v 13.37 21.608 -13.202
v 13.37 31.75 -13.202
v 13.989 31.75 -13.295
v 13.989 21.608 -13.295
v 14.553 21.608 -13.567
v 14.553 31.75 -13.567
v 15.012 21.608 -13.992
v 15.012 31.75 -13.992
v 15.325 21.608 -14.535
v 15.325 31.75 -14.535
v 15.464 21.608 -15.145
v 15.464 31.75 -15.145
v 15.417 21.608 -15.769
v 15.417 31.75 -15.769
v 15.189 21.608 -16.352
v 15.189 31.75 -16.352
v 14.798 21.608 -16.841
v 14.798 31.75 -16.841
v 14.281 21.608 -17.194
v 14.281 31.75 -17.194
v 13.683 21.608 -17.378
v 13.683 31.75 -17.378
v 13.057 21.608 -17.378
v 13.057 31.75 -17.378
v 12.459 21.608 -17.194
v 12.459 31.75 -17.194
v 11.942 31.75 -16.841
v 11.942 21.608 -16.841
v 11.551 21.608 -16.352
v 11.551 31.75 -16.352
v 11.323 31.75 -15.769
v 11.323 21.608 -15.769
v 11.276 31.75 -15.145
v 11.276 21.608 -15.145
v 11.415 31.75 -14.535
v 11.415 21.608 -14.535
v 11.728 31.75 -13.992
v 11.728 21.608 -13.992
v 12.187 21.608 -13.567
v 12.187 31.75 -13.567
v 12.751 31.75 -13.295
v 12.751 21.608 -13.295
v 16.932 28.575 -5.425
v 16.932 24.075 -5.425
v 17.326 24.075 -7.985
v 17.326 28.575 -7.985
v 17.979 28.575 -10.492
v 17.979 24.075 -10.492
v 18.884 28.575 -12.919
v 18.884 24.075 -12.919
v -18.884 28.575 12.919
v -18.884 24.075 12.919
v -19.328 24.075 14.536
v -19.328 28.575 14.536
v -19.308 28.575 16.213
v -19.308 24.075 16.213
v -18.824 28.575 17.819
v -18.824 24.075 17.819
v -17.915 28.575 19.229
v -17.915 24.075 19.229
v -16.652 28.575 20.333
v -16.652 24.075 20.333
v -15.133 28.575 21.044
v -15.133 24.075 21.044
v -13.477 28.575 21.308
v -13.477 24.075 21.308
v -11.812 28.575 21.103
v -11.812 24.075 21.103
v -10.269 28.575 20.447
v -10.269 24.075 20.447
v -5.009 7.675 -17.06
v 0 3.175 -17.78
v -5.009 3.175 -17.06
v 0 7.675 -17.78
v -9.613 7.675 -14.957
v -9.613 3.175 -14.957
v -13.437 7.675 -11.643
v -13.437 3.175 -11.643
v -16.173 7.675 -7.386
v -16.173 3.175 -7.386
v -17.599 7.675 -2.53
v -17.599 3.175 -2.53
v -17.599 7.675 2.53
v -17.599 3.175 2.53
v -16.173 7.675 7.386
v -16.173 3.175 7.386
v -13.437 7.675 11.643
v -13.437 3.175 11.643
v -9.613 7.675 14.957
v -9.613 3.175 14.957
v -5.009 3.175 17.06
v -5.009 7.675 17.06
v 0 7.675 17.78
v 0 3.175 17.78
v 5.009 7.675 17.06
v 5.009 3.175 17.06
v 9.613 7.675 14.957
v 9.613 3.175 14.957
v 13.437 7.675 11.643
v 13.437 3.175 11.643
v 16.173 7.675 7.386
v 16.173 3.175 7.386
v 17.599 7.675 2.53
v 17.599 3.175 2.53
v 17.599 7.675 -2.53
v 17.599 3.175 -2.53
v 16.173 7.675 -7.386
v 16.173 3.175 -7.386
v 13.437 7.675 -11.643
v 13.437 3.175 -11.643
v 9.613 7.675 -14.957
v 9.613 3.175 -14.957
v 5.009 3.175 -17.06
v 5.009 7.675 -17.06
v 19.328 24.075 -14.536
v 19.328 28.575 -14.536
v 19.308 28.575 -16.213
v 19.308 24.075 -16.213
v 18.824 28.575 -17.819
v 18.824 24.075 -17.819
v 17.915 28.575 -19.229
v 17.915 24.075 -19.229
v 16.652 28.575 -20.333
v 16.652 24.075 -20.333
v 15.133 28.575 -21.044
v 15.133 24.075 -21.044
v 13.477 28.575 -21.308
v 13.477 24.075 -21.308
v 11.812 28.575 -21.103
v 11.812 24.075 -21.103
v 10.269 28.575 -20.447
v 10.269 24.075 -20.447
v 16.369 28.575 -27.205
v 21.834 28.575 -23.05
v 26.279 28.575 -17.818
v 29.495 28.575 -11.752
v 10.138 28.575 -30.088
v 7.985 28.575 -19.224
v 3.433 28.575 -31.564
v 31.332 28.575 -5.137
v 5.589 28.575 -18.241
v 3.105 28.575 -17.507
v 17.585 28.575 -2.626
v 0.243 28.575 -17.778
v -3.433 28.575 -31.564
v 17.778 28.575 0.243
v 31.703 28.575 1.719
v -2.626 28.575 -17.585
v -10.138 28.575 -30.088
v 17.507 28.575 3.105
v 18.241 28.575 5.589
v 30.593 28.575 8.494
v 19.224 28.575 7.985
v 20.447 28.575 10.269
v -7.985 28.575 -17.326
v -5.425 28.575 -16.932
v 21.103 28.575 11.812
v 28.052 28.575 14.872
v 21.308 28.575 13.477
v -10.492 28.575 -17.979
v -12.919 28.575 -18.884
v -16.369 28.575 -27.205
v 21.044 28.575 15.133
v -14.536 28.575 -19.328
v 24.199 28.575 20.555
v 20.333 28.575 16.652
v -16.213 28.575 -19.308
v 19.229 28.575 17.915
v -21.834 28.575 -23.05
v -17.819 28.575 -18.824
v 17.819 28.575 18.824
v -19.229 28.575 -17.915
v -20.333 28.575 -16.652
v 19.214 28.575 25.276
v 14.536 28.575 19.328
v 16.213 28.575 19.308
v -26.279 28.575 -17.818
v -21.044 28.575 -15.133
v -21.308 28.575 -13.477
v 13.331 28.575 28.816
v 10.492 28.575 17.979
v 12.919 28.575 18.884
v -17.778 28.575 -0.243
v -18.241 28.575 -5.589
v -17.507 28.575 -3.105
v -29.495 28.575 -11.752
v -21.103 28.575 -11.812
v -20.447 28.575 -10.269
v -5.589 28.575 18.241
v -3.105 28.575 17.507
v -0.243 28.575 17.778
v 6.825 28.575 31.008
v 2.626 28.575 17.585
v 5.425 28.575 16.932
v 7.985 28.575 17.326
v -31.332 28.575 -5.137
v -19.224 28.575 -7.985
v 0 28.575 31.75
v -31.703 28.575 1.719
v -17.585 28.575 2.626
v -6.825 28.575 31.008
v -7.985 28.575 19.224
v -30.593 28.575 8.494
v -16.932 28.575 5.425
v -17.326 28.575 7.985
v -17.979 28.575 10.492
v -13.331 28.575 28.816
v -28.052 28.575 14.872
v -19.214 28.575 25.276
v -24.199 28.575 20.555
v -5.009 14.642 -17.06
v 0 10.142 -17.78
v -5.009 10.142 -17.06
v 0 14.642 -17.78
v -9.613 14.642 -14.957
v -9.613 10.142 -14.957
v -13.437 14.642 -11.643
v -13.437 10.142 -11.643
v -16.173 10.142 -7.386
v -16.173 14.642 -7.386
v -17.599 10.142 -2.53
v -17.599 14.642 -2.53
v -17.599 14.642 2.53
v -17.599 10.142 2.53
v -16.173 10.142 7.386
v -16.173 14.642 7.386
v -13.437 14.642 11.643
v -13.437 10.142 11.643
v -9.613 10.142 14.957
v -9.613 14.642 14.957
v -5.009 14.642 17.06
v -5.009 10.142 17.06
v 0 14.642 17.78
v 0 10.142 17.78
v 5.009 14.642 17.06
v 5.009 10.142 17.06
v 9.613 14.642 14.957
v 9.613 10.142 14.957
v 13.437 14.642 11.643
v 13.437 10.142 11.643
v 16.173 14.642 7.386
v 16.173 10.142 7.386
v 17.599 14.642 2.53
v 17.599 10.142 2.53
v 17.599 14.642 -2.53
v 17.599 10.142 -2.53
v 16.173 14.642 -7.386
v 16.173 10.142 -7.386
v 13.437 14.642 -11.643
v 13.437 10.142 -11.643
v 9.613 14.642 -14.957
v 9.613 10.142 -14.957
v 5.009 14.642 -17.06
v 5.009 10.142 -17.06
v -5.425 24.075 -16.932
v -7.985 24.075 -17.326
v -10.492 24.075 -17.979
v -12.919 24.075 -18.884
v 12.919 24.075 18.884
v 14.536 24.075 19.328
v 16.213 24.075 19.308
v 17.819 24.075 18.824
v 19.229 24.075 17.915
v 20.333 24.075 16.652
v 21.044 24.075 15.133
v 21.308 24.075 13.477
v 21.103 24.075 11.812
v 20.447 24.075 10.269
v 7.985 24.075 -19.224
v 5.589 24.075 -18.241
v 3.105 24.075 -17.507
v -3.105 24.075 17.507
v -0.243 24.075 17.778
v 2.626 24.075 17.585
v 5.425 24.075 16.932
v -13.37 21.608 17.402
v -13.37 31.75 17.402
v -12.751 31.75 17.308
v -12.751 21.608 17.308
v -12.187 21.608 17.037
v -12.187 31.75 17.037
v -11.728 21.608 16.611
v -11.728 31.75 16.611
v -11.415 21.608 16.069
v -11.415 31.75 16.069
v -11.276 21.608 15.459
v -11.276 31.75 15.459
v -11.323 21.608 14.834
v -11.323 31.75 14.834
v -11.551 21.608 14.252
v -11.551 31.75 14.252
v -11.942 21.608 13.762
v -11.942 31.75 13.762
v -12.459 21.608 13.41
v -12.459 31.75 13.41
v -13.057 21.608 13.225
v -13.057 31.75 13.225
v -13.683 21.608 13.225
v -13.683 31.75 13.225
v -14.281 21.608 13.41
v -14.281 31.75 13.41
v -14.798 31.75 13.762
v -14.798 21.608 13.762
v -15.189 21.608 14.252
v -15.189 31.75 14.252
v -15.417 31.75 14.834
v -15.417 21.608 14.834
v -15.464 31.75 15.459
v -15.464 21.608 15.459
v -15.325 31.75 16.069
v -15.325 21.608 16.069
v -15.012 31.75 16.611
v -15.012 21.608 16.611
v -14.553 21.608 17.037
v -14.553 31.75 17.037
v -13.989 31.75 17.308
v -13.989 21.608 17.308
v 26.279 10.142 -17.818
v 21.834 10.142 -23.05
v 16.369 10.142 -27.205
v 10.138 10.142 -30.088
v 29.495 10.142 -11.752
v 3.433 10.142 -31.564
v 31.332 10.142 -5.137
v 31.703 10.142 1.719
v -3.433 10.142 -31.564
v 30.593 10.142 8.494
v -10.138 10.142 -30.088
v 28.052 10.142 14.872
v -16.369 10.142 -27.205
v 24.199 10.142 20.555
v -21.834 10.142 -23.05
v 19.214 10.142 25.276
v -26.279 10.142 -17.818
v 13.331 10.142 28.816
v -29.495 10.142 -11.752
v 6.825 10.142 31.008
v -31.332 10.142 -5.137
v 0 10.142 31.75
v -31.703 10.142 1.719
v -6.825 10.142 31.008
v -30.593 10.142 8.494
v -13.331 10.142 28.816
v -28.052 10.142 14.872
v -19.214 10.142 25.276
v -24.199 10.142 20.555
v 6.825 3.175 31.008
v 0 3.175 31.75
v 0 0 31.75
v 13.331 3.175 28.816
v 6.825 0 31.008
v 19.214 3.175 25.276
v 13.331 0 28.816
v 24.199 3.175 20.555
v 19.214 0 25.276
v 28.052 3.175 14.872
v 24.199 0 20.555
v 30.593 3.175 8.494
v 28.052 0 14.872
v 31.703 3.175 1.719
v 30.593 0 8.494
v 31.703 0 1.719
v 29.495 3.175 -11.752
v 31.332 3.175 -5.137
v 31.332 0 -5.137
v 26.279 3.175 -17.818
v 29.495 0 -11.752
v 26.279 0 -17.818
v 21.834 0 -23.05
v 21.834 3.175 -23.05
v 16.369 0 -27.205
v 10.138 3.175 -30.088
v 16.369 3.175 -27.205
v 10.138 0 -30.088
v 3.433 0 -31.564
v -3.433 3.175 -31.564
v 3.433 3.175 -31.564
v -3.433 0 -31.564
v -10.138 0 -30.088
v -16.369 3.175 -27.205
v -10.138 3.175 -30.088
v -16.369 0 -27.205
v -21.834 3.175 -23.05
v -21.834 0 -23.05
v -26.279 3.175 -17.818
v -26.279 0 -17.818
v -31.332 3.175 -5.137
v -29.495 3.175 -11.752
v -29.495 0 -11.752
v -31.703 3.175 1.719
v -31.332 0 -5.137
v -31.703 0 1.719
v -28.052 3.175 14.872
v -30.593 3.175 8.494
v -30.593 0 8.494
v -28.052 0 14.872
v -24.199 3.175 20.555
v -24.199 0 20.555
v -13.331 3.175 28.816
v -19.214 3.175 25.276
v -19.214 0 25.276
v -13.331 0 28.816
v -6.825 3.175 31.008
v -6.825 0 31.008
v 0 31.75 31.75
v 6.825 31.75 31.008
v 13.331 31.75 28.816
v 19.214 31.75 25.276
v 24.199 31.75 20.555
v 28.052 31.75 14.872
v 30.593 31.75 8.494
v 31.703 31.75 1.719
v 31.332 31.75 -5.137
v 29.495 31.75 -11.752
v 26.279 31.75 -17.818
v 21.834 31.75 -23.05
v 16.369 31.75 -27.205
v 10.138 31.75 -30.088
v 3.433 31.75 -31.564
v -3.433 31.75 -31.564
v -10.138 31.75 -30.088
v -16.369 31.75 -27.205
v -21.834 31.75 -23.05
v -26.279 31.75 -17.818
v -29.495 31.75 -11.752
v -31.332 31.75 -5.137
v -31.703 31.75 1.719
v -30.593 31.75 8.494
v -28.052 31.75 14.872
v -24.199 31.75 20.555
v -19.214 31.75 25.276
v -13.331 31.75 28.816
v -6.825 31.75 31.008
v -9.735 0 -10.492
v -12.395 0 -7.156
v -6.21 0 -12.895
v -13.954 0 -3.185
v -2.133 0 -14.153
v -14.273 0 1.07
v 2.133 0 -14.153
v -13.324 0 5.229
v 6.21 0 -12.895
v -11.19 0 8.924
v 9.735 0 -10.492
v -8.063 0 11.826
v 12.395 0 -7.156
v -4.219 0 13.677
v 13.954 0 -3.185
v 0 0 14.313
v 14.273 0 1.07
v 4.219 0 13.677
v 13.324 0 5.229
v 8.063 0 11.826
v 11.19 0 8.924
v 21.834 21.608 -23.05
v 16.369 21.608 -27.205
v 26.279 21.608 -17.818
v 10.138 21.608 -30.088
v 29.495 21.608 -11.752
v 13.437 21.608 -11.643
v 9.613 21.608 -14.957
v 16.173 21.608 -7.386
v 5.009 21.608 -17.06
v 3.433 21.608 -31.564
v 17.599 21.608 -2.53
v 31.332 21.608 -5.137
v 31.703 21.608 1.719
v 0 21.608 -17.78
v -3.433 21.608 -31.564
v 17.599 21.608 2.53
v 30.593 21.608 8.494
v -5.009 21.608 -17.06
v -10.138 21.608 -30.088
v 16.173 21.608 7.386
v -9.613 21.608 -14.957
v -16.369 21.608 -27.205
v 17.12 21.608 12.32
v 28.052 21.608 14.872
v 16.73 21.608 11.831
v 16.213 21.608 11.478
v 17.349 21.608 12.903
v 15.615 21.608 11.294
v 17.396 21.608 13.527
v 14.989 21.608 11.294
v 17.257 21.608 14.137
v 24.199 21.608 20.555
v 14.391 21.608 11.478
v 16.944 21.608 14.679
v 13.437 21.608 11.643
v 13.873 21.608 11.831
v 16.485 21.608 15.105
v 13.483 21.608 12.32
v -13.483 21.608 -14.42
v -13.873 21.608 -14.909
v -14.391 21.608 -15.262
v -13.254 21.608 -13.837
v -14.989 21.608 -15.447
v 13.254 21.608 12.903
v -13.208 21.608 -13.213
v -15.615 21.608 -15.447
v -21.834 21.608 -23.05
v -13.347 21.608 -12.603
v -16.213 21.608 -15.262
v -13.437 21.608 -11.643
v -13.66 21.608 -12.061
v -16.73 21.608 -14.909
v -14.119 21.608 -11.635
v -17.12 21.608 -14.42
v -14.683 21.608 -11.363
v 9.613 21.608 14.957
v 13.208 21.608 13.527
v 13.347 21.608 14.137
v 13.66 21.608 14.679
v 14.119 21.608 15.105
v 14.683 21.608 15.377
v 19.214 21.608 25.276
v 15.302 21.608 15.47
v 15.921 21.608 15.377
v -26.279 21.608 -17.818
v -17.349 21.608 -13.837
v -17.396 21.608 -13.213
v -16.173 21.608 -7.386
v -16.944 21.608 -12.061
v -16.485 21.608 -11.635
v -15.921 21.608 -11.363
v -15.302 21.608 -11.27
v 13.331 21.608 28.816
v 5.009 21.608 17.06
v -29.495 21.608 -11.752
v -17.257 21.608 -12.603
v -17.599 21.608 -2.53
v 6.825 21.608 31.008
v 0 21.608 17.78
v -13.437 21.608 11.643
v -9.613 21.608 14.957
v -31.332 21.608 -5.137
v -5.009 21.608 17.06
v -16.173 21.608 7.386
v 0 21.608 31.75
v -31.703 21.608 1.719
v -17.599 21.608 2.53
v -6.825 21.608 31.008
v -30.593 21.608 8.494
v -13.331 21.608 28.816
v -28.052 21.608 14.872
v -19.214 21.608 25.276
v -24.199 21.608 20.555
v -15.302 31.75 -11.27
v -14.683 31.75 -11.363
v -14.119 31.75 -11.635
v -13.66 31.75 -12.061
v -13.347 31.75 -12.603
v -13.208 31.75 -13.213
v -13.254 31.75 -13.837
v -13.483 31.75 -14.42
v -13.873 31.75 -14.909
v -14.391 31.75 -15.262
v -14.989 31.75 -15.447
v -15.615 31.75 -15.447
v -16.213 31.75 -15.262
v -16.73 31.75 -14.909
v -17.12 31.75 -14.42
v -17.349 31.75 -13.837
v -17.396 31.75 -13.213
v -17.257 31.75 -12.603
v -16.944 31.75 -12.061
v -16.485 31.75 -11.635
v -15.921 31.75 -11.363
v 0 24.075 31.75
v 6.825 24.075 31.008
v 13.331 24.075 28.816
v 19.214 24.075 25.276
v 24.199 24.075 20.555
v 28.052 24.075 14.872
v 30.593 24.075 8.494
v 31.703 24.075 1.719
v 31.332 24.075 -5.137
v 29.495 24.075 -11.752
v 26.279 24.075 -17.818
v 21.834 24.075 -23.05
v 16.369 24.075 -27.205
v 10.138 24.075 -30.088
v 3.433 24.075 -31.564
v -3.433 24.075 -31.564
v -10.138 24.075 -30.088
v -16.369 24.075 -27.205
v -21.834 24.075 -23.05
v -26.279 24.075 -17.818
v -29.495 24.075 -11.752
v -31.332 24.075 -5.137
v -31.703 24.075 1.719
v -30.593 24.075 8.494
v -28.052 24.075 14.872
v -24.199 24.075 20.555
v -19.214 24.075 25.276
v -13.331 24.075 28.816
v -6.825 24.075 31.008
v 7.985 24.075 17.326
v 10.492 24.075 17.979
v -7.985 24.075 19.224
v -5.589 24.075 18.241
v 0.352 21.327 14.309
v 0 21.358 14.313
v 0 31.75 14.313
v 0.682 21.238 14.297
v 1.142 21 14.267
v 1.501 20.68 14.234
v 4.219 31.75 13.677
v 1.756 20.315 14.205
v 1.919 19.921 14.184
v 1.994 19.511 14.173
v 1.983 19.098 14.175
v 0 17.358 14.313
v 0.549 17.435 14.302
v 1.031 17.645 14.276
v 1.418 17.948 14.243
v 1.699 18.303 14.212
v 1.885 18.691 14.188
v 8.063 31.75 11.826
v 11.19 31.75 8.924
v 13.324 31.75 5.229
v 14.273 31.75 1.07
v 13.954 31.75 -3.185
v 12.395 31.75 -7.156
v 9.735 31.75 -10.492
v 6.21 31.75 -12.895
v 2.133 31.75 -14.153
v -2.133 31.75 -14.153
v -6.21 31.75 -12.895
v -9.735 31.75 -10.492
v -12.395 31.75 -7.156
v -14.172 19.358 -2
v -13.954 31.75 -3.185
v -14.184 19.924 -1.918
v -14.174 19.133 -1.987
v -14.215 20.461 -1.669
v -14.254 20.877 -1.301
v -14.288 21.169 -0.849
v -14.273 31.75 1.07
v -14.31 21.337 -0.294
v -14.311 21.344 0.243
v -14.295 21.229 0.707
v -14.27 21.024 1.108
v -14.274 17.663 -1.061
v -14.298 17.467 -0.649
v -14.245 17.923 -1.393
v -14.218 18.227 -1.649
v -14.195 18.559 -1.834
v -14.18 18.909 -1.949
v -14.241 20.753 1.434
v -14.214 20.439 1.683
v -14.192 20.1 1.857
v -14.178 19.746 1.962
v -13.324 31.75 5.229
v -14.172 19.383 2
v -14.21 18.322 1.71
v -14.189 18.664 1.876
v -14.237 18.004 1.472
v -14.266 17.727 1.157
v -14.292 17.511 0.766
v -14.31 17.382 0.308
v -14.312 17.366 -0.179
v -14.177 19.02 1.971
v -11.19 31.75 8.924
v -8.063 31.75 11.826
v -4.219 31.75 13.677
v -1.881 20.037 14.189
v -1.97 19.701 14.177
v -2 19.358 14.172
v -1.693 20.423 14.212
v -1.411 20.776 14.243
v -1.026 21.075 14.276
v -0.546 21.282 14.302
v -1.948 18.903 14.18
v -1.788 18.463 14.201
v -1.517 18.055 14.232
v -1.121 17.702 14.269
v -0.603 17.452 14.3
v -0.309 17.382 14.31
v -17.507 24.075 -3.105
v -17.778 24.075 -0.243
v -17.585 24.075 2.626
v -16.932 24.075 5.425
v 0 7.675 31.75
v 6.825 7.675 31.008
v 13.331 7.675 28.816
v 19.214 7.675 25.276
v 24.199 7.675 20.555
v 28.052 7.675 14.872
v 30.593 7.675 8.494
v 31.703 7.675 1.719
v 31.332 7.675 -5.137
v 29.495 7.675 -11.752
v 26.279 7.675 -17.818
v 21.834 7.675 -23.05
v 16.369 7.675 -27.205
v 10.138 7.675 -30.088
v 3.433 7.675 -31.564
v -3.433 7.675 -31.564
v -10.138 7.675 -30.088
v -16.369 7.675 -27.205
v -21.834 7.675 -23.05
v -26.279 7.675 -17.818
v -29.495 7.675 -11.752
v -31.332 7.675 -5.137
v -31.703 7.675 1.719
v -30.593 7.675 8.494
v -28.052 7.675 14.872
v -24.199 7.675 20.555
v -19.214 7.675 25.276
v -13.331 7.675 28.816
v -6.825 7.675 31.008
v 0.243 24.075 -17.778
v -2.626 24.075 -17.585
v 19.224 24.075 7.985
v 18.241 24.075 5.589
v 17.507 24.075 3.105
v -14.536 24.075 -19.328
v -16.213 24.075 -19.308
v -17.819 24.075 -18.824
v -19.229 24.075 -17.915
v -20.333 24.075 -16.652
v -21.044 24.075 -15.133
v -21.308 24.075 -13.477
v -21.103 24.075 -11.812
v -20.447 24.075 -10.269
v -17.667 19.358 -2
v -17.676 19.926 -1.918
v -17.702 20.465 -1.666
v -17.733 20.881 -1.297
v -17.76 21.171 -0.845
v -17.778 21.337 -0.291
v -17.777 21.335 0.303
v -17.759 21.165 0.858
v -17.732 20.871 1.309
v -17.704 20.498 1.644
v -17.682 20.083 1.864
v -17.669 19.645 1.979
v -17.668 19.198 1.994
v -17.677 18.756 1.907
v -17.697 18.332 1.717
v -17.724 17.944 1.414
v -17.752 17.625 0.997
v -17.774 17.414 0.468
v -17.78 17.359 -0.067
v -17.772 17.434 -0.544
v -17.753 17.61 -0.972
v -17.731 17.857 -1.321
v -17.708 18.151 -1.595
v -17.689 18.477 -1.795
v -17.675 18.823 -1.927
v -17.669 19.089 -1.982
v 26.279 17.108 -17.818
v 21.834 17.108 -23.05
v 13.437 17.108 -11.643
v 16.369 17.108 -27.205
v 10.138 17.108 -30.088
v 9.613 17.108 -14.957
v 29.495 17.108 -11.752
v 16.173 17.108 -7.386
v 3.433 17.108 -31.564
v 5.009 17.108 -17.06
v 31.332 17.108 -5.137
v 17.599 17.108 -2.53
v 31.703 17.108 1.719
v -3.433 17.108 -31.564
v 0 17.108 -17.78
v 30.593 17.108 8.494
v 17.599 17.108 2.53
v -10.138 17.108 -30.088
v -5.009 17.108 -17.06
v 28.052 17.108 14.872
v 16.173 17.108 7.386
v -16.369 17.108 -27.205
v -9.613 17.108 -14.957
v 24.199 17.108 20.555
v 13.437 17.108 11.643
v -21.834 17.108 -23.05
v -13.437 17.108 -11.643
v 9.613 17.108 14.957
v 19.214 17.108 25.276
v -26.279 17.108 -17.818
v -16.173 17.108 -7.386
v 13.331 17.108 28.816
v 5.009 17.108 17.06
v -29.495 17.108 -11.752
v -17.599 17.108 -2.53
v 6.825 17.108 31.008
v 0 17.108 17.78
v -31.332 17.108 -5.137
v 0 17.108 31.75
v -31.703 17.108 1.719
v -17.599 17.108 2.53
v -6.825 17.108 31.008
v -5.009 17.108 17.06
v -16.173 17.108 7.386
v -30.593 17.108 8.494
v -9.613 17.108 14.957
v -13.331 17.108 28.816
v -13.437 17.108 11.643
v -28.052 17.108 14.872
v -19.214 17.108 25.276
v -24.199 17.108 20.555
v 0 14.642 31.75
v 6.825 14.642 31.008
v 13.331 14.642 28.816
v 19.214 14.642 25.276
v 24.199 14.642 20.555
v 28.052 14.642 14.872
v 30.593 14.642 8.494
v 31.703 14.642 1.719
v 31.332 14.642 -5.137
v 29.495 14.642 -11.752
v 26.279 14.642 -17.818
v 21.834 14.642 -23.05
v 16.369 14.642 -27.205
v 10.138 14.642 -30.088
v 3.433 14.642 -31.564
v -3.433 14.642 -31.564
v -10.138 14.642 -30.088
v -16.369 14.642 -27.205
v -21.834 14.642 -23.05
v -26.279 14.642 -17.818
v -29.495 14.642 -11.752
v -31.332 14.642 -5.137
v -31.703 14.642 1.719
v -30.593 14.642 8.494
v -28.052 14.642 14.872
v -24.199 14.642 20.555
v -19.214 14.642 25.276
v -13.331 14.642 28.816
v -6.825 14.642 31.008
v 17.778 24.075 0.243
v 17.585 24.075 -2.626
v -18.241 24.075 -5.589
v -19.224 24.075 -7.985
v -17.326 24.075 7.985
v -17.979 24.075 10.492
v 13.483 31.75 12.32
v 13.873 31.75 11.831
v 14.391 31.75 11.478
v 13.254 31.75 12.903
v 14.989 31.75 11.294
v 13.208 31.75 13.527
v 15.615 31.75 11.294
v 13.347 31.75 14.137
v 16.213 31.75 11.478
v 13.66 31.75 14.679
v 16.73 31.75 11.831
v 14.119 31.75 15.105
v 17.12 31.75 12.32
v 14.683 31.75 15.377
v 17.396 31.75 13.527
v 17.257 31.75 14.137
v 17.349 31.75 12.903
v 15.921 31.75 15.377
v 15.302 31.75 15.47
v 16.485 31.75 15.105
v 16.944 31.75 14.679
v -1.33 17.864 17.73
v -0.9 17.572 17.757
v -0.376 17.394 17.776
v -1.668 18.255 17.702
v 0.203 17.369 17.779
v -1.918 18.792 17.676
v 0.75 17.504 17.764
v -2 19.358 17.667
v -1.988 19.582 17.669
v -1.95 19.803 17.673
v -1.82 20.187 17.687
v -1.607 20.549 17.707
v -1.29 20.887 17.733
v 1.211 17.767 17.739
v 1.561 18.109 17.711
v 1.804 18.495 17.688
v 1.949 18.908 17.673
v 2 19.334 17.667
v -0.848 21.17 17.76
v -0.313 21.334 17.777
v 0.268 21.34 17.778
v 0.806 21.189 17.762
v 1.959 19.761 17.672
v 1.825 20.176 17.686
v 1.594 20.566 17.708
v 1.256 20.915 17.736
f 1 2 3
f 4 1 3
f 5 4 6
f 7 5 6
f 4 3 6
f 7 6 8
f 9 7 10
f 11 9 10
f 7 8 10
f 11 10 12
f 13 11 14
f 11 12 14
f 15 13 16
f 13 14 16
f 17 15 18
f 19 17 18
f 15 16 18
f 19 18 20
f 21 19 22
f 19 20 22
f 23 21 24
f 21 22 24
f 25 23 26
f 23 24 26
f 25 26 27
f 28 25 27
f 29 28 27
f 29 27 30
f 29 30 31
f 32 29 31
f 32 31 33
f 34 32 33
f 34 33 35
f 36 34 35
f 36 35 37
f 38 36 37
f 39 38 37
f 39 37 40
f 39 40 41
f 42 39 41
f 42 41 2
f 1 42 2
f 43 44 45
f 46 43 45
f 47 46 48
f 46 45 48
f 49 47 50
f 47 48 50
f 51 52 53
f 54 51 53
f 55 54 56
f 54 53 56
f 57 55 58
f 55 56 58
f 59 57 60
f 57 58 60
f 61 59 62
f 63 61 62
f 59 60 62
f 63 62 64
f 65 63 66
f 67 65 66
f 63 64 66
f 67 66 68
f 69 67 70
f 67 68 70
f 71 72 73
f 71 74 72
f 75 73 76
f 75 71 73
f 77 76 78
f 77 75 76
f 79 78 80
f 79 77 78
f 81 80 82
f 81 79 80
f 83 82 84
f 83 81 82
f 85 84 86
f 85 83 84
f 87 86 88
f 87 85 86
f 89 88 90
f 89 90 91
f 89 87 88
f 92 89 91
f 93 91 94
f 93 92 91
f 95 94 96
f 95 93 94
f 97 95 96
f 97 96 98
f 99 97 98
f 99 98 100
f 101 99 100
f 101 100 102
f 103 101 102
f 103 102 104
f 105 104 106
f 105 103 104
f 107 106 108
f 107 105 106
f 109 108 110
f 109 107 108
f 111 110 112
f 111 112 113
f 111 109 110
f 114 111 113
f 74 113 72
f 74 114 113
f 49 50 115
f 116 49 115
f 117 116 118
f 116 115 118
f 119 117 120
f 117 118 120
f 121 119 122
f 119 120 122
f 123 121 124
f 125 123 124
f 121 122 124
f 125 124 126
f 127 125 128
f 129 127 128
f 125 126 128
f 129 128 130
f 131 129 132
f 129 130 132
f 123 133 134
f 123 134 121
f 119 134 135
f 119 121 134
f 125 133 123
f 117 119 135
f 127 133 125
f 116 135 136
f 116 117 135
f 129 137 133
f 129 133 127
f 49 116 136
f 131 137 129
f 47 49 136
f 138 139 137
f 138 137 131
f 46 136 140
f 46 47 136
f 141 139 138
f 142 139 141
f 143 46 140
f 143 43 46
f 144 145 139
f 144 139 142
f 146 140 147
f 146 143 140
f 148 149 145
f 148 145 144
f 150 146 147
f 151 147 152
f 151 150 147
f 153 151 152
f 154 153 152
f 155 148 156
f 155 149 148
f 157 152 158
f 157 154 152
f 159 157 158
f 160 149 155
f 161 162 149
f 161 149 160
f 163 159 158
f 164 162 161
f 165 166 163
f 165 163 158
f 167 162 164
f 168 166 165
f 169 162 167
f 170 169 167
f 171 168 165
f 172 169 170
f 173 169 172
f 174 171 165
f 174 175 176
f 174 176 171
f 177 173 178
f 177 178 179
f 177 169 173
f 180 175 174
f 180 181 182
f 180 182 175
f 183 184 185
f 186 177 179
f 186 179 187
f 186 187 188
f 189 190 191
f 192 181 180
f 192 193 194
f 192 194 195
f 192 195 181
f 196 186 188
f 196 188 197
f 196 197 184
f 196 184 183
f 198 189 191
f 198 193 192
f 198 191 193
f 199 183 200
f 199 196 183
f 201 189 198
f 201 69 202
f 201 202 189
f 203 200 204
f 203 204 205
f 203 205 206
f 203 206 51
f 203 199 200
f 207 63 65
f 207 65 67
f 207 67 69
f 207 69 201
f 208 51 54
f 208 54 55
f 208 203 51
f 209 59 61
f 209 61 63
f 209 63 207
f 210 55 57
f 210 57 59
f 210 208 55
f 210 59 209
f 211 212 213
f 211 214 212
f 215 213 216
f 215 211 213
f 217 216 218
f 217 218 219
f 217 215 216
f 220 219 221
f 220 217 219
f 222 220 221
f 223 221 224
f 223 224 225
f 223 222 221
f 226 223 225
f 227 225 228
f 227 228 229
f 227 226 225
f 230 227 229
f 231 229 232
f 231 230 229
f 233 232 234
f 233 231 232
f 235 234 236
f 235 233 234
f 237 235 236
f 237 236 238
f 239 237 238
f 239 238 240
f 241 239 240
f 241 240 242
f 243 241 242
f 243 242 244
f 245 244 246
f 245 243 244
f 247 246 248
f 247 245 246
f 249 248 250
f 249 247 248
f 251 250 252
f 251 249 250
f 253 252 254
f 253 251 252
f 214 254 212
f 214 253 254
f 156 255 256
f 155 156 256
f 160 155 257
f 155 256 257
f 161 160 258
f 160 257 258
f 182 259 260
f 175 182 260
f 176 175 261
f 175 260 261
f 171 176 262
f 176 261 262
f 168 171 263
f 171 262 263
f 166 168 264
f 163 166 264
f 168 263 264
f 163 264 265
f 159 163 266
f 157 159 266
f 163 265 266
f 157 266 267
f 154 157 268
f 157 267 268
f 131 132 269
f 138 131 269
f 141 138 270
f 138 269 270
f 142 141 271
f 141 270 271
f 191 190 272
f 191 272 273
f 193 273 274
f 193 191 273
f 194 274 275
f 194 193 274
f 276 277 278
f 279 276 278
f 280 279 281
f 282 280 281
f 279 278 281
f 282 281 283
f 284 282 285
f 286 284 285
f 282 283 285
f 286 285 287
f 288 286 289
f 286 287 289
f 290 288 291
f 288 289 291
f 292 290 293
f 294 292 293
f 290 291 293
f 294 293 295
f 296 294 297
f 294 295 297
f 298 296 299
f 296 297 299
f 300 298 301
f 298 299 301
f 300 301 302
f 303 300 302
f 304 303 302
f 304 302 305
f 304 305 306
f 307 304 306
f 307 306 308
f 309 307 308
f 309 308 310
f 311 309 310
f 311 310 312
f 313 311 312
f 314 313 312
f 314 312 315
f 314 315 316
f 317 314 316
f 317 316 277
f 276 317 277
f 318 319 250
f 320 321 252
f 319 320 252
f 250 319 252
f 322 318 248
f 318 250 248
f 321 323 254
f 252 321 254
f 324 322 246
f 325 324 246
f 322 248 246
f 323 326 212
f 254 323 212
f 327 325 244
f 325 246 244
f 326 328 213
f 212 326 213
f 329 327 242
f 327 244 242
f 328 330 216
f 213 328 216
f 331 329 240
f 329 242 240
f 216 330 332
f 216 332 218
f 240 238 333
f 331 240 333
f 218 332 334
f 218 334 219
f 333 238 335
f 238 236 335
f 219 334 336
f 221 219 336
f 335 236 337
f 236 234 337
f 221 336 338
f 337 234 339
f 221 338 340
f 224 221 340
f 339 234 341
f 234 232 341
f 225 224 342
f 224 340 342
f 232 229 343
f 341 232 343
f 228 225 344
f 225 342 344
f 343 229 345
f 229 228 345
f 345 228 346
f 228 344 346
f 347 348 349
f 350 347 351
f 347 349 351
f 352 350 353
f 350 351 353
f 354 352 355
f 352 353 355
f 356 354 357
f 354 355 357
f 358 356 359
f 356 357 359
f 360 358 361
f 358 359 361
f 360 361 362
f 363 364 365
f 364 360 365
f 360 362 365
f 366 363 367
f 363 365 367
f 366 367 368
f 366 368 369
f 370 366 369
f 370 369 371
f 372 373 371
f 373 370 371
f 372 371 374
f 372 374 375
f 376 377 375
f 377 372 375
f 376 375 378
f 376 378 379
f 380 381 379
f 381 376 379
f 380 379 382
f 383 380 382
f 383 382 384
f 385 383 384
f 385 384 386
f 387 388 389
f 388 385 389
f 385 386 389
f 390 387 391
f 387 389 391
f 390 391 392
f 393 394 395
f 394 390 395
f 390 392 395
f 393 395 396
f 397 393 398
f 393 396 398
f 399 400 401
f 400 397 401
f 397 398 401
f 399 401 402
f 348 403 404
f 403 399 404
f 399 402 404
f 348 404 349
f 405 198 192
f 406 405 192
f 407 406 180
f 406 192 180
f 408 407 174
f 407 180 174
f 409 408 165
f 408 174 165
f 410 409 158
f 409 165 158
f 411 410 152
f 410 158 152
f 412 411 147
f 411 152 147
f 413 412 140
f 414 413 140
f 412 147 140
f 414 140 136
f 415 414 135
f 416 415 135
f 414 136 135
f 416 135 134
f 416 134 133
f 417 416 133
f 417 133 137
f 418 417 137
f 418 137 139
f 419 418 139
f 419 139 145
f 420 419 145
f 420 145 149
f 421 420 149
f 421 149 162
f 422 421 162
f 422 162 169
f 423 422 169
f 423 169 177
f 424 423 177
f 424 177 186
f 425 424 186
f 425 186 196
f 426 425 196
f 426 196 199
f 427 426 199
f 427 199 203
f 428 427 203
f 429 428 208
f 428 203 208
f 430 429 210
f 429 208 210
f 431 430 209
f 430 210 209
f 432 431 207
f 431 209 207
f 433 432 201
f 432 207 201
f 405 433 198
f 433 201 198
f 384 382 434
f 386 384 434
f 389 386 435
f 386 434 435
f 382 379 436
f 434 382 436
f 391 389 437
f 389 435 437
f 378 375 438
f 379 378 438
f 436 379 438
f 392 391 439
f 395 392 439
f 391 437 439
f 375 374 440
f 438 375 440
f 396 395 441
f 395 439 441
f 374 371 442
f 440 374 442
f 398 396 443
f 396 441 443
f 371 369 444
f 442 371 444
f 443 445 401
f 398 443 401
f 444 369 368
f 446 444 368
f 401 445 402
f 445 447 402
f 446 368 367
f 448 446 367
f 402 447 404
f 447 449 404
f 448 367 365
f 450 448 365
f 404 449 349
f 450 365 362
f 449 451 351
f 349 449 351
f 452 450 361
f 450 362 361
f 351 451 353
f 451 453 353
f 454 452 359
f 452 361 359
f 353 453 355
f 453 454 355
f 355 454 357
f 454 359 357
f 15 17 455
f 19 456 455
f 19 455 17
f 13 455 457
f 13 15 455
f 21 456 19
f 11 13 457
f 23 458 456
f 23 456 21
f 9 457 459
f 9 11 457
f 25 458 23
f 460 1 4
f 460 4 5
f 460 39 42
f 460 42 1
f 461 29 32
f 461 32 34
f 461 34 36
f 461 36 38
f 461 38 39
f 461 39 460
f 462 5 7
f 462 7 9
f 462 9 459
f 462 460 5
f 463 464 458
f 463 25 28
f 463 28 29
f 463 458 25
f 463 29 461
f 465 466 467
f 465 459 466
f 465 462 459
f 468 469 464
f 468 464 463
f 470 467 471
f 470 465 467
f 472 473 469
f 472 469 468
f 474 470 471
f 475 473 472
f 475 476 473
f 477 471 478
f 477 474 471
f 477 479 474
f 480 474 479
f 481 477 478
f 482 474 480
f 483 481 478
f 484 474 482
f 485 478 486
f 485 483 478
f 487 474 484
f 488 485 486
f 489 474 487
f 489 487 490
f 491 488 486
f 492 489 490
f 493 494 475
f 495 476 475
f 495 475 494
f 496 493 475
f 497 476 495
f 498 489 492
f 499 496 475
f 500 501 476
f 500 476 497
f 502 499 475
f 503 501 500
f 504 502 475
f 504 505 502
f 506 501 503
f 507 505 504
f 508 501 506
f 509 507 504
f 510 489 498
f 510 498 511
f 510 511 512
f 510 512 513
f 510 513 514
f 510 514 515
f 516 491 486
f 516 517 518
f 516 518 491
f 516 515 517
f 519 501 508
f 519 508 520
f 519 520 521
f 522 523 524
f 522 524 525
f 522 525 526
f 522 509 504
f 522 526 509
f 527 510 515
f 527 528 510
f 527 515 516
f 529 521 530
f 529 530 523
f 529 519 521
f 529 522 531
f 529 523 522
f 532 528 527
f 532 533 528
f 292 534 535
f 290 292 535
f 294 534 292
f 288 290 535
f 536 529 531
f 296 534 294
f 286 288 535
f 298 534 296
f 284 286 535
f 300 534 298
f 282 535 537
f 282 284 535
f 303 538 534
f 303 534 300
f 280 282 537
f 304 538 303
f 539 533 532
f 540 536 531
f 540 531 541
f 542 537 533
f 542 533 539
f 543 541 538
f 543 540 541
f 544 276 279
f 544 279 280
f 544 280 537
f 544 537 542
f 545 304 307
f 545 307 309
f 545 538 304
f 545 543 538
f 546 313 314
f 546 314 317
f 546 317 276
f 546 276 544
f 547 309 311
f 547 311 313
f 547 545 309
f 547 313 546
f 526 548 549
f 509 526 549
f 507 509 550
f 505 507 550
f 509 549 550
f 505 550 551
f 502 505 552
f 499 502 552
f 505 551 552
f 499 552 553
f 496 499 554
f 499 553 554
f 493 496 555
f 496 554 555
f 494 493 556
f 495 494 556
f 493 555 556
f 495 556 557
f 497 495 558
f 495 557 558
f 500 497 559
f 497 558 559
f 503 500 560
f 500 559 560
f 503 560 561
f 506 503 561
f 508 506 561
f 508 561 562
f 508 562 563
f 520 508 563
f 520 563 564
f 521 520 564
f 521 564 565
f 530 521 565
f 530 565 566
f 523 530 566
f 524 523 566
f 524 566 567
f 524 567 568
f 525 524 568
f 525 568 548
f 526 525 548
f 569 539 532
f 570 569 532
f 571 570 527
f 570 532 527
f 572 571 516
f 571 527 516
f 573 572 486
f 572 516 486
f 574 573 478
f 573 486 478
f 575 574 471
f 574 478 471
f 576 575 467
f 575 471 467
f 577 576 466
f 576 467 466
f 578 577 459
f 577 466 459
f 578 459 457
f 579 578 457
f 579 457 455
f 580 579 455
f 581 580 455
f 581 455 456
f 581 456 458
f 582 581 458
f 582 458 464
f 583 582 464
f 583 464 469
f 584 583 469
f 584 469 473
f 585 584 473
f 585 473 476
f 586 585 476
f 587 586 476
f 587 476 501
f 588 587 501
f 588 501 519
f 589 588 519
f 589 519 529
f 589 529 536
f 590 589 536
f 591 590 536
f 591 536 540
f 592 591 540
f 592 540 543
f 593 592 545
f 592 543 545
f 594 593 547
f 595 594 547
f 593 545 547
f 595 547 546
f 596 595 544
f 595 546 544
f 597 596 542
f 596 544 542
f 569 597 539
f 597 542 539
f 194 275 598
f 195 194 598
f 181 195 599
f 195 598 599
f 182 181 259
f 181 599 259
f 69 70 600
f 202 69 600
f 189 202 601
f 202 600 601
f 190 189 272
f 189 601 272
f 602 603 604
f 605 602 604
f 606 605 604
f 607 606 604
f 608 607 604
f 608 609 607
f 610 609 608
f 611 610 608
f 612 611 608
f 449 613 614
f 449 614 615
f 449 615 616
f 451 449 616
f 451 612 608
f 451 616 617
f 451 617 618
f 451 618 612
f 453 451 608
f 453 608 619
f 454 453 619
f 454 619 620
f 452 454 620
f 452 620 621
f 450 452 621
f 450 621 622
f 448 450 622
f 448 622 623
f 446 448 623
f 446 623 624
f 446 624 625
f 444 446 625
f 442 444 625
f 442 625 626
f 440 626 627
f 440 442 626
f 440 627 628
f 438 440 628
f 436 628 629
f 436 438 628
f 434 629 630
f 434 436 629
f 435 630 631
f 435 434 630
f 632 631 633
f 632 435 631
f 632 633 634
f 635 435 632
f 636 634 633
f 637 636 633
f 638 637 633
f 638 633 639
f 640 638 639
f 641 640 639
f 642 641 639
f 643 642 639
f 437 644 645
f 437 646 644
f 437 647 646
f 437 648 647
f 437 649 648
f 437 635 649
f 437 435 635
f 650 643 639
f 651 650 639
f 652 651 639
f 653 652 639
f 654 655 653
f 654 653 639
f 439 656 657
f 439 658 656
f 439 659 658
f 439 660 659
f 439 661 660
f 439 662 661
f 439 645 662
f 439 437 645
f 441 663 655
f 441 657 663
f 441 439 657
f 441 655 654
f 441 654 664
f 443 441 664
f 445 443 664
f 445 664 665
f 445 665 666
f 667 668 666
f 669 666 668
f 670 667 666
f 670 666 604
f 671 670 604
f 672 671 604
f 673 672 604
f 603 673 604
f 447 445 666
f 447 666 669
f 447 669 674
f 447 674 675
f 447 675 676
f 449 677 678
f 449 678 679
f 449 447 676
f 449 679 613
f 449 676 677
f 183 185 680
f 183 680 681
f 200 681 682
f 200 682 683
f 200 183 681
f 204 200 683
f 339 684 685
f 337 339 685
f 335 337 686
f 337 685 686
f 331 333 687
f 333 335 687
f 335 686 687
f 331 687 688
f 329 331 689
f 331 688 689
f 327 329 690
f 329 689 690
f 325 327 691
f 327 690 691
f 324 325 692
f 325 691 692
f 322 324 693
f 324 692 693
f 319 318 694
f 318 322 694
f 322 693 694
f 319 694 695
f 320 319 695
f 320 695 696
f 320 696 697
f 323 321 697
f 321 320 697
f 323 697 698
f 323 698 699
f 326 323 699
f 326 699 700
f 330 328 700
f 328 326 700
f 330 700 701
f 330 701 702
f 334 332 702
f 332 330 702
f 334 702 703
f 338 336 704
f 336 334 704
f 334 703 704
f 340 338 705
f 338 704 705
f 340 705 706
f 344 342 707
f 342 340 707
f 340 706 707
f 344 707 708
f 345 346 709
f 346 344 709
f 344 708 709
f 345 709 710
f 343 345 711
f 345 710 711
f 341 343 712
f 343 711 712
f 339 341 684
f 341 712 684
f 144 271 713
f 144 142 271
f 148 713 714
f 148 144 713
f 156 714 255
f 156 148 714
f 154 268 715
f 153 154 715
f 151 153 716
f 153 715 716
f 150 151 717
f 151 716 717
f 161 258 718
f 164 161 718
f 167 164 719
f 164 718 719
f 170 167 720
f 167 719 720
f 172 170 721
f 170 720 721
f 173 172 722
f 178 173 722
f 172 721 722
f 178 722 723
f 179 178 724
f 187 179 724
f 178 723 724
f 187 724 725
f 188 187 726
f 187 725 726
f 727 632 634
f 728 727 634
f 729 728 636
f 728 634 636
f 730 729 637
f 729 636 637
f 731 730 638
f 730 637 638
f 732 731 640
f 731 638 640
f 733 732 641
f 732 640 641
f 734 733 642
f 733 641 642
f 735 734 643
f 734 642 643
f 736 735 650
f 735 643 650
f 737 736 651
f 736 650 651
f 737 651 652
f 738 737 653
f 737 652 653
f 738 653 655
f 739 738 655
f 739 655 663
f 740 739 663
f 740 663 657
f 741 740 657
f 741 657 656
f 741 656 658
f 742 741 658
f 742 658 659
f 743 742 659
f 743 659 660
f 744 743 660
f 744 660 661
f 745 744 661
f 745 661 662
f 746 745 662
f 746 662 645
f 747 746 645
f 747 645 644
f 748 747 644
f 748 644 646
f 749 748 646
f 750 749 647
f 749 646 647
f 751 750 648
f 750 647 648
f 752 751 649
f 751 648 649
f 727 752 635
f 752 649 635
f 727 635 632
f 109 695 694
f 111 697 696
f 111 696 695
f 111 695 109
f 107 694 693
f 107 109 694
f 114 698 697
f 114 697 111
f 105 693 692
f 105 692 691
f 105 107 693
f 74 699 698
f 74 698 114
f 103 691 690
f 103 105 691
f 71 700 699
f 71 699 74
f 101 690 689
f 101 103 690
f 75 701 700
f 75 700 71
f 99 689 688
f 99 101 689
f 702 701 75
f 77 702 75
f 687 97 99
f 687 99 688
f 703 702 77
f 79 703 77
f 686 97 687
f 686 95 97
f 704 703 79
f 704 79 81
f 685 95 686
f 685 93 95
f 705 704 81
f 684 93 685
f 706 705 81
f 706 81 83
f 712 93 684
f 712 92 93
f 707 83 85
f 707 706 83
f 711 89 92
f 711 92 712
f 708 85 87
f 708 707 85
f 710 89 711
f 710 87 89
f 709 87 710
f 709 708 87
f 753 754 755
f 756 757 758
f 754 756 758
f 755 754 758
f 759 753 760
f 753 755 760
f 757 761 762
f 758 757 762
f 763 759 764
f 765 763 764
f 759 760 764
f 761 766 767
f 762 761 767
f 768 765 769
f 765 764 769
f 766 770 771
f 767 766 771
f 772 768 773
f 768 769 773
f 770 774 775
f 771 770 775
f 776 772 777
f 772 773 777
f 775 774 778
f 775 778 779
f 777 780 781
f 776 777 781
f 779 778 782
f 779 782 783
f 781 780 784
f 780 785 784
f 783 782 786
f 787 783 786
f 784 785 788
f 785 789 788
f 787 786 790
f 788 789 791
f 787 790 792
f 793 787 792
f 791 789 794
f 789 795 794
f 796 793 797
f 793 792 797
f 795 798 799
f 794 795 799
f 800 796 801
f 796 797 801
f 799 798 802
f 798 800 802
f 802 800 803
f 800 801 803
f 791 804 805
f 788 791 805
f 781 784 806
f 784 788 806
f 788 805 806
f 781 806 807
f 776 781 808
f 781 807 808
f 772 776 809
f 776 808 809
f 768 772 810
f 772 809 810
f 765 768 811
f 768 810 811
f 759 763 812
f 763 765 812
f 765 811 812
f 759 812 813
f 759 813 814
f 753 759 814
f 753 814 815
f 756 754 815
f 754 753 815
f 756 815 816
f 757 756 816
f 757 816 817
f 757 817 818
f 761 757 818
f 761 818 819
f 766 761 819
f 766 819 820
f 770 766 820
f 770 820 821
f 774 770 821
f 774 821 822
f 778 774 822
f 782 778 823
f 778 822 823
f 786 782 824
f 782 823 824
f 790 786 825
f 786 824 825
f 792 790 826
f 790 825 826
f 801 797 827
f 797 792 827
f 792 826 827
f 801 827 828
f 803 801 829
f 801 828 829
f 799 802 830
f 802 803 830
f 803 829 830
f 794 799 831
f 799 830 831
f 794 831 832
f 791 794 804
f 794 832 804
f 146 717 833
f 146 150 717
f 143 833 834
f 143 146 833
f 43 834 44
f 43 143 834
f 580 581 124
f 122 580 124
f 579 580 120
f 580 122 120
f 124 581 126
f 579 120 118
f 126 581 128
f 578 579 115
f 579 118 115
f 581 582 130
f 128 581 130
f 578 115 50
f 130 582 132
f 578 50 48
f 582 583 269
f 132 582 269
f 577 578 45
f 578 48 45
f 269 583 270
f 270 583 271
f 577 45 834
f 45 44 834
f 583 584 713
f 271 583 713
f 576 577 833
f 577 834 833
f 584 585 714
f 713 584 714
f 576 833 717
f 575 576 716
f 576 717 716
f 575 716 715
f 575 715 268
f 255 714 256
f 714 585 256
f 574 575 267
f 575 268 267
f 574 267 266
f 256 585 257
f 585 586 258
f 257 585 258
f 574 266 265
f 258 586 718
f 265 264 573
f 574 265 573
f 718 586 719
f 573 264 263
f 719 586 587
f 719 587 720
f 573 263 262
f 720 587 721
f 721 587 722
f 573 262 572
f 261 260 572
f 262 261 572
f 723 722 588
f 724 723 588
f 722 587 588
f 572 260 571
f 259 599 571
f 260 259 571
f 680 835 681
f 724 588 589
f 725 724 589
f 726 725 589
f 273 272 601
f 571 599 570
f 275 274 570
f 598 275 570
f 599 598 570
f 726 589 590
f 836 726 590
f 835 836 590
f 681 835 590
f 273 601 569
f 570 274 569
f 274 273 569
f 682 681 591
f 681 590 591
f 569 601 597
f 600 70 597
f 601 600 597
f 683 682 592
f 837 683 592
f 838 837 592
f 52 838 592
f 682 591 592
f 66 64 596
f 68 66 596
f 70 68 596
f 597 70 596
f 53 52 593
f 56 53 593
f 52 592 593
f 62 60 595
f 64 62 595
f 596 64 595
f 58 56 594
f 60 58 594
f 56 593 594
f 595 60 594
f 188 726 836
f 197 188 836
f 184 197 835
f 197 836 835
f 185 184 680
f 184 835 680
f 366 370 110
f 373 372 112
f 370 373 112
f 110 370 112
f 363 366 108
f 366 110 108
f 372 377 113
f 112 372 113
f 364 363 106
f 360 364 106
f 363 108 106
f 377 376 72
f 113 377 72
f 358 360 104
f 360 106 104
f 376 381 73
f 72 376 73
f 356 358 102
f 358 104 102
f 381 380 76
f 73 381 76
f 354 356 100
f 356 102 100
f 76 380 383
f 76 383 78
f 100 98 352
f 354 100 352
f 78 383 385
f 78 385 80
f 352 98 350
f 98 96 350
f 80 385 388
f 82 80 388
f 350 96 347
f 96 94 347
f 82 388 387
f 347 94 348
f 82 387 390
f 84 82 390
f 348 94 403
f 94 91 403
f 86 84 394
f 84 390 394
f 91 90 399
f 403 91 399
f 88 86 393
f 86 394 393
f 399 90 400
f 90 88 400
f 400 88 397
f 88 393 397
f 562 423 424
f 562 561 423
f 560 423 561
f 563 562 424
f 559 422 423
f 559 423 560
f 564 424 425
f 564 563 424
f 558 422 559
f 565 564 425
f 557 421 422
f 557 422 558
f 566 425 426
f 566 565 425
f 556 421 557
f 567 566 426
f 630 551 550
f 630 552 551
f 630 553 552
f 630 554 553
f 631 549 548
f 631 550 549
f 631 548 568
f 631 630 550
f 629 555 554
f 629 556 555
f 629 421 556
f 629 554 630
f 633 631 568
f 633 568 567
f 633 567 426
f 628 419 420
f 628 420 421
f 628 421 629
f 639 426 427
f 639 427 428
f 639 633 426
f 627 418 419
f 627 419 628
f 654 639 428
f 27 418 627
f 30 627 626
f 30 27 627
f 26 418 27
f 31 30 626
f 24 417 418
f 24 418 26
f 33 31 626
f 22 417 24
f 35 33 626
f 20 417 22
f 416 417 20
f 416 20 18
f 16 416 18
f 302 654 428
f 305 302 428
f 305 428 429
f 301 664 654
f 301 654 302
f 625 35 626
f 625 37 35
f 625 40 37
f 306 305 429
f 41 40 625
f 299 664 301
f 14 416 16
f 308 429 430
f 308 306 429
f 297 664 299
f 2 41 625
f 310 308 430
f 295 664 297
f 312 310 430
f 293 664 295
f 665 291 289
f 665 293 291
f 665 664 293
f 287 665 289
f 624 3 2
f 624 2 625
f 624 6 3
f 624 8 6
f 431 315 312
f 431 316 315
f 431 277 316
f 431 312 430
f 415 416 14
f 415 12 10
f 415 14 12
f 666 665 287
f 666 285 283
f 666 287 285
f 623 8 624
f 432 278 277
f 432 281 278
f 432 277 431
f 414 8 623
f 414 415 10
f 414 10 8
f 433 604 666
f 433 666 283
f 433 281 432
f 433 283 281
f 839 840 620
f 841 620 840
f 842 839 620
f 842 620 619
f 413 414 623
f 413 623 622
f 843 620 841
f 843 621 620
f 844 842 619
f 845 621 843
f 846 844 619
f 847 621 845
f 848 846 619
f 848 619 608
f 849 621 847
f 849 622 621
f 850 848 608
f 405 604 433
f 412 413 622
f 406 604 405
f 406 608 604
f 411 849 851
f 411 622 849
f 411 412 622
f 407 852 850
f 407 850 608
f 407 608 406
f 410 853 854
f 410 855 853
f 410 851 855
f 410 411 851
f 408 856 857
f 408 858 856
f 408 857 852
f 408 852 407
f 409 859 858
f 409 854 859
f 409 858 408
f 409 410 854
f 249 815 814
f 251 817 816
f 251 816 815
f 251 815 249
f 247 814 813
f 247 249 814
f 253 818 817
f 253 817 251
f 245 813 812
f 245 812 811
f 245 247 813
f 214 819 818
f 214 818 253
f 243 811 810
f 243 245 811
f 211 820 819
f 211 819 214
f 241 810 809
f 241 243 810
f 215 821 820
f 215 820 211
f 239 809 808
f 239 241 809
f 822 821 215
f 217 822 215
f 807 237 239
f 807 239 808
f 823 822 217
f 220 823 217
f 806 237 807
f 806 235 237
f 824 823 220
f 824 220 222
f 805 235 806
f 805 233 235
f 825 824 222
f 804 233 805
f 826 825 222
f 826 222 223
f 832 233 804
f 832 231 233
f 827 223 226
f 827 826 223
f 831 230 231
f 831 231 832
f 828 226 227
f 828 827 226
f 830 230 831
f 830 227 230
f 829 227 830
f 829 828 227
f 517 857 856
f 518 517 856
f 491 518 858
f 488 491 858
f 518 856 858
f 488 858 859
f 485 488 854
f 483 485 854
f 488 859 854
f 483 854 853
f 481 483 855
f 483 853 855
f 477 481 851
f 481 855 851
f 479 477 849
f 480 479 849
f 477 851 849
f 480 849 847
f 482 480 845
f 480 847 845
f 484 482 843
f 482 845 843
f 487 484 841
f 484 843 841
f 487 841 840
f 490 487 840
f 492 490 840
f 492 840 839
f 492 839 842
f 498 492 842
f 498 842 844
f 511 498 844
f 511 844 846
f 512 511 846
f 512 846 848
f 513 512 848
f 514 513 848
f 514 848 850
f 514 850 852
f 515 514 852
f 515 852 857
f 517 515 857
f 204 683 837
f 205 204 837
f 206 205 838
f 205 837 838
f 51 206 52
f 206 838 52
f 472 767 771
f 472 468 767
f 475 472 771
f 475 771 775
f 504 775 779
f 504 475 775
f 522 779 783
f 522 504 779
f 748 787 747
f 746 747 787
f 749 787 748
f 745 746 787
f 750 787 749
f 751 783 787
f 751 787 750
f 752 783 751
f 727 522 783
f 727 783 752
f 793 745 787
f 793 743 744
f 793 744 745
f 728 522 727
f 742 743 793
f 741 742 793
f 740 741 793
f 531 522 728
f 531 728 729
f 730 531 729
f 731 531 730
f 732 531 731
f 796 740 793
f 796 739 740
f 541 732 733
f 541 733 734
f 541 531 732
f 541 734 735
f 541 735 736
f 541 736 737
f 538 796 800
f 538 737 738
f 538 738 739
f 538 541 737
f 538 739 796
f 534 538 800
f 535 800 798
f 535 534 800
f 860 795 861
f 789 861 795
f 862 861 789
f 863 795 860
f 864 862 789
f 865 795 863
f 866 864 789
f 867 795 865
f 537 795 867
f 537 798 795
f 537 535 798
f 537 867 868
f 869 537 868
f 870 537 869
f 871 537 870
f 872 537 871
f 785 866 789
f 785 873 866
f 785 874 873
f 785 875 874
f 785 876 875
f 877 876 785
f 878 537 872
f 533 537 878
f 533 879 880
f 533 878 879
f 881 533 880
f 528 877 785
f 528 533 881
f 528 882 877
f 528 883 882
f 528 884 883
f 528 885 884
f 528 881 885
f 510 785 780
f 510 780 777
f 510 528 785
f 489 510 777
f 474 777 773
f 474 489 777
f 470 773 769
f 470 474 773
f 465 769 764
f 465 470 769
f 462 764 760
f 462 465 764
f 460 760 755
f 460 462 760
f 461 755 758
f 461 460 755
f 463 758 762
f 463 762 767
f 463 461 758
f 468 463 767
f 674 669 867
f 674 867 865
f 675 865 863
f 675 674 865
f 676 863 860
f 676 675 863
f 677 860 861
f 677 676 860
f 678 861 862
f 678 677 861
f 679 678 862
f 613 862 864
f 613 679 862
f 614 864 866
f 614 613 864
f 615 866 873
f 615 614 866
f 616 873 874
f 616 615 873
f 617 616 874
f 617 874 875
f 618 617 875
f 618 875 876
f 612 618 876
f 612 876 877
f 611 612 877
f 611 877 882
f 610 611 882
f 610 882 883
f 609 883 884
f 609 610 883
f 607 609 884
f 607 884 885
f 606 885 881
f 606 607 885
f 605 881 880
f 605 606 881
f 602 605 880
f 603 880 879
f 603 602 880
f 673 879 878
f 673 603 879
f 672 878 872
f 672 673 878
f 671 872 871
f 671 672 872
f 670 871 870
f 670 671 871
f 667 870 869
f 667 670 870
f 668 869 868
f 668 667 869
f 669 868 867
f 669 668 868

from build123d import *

# Parameters (mm, degrees)
SKETCH1_R                        = 31.75
SKETCH1_R_2                      = 14.3129
BOSS_EXTRUDE1_DEPTH              = 31.75
SKETCH2_W                        = 13.97
SKETCH2_H                        = 4.5
BOSS_EXTRUDE2_START              = -7.675
BOSS_EXTRUDE2_DEPTH              = 4.5
CUT_EXTRUDE2_REACH               = 56.993
CUT_EXTRUDE2_END_RADIUS          = 17.78
SKETCH8_R                        = 2
CUT_EXTRUDE3_REACH               = 56.993
CUT_EXTRUDE3_END_RADIUS          = 17.78
SKETCH9_R                        = 2
SKETCH10_R                       = 1
CUT_EXTRUDE4_DEPTH               = 10.141666667
TAP_DRILL_FOR_M5X0_8_TAP1_REACH  = 74.51
TAP_DRILL_FOR_M5X0_8_TAP1_BORE_R = 2.1


# Read off the part's stored shape, not the designer's step: Boss-Extrude2
with BuildPart() as part:
    # Sketch1 → Boss-Extrude1 (new body)
    with BuildSketch(Plane(origin=(0, 0, 0), x_dir=(1, 0, 0), z_dir=(0, 1, 0))):
        with Locations(Location((0, 0, 0), (0, 0, 270))):
            Circle(SKETCH1_R)
        with Locations(Location((0, 0, 0), (0, 0, 270))):
            Circle(SKETCH1_R_2, mode=Mode.SUBTRACT)
    extrude(amount=BOSS_EXTRUDE1_DEPTH)

    # Sketch2 → Cut-Revolve2 (revolve, cut)
    with BuildSketch(Plane.XY, mode=Mode.PRIVATE) as cut_revolve2_sk:
        with Locations((24.765, 26.325)):
            Rectangle(SKETCH2_W, SKETCH2_H)
        with Locations((24.765, 12.391666667)):
            Rectangle(SKETCH2_W, SKETCH2_H)
        with Locations((24.765, 5.425)):
            Rectangle(SKETCH2_W, SKETCH2_H)
        with Locations((24.765, 19.358333333)):
            Rectangle(SKETCH2_W, SKETCH2_H)
    revolve(cut_revolve2_sk.sketch.rotate(Axis((0, 0, 0), (0, 1, 0)), 90), axis=Axis((0, 0, 0), (0, 1, 0)), mode=Mode.SUBTRACT)

    # Boss-Extrude2 outline → Boss-Extrude2 (add)
    with BuildSketch(Plane(origin=(0, 31.75, 0), x_dir=(1, 0, 0), z_dir=(0, 1, 0)).offset(BOSS_EXTRUDE2_START)):
        with BuildLine():
            ThreePointArc((-10.269067687, -20.446529483), (-6.799835435, -18.70202978), (-3.105226449, -17.506740665))
            ThreePointArc((-3.105226449, -17.506740665), (-11.698828781, -13.38901808), (-16.932025536, -5.425395031))
            ThreePointArc((-16.932025536, -5.425395031), (-17.620944734, -9.246944713), (-18.884341927, -12.918821503))
            ThreePointArc((-18.884341927, -12.918821503), (-17.322622903, -19.825310342), (-10.269067687, -20.446529483))
        make_face()
        with BuildLine():
            ThreePointArc((17.506740665, -3.105226449), (13.38901808, -11.698828781), (5.425395031, -16.932025536))
            ThreePointArc((5.425395031, -16.932025536), (9.246944713, -17.620944734), (12.918821503, -18.884341927))
            ThreePointArc((12.918821503, -18.884341927), (19.825310342, -17.322622903), (20.446529483, -10.269067687))
            ThreePointArc((20.446529483, -10.269067687), (18.70202978, -6.799835435), (17.506740665, -3.105226449))
        make_face()
        with BuildLine():
            ThreePointArc((-20.446529483, 10.269067687), (-18.70202978, 6.799835435), (-17.506740665, 3.105226449))
            ThreePointArc((-17.506740665, 3.105226449), (-13.38901808, 11.698828781), (-5.425395031, 16.932025536))
            ThreePointArc((-5.425395031, 16.932025536), (-9.246944713, 17.620944734), (-12.918821503, 18.884341927))
            ThreePointArc((-12.918821503, 18.884341927), (-19.825310342, 17.322622903), (-20.446529483, 10.269067687))
        make_face()
        with BuildLine():
            ThreePointArc((10.269067687, 20.446529483), (6.799835435, 18.70202978), (3.105226449, 17.506740665))
            ThreePointArc((3.105226449, 17.506740665), (11.698828781, 13.38901808), (16.932025536, 5.425395031))
            ThreePointArc((16.932025536, 5.425395031), (17.620944734, 9.246944713), (18.884341927, 12.918821503))
            ThreePointArc((18.884341927, 12.918821503), (17.322622903, 19.825310342), (10.269067687, 20.446529483))
        make_face()
    extrude(amount=BOSS_EXTRUDE2_DEPTH)

    # Cut-Extrude2: up to this cylinder (the profile starts inside it)
    cut_extrude2_end = Plane(origin=(0, 19.358333, 0), z_dir=(0, -1, 0)) * Cylinder(CUT_EXTRUDE2_END_RADIUS, 150.546, mode=Mode.PRIVATE)
    # Sketch8 → Cut-Extrude2 (cut, up to the surface)
    with BuildSketch(Plane.XY, mode=Mode.PRIVATE) as cut_extrude2_sk1:
        with Locations(Location((0, 19.358333333, 0), (0, 0, 180))):
            Circle(SKETCH8_R)
    cut_extrude2_tool1 = extrude(cut_extrude2_sk1.sketch, amount=CUT_EXTRUDE2_REACH, mode=Mode.PRIVATE) & cut_extrude2_end
    add(cut_extrude2_tool1.solids().sort_by_distance((0, 19.358333, 0))[0], mode=Mode.SUBTRACT)

    # Cut-Extrude3: up to this cylinder (the profile starts inside it)
    cut_extrude3_end = Plane(origin=(0, 19.358333, 0), z_dir=(0, -1, 0)) * Cylinder(CUT_EXTRUDE3_END_RADIUS, 150.546, mode=Mode.PRIVATE)
    # Sketch9 → Cut-Extrude3 (cut, up to the surface)
    with BuildSketch(Plane(origin=(0, 0, 0), x_dir=(0, 0, -1), z_dir=(1, 0, 0)), mode=Mode.PRIVATE) as cut_extrude3_sk1:
        with Locations((0, 19.358333333)):
            Circle(SKETCH9_R)
    cut_extrude3_tool1 = extrude(cut_extrude3_sk1.sketch, amount=-CUT_EXTRUDE3_REACH, mode=Mode.PRIVATE) & cut_extrude3_end
    add(cut_extrude3_tool1.solids().sort_by_distance((0, 19.358333, 0))[0], mode=Mode.SUBTRACT)

    # Sketch10 → Cut-Extrude4 (cut)
    with BuildSketch(Plane(origin=(0, 31.75, 0), x_dir=(1, 0, 0), z_dir=(0, 1, 0))):
        with Locations(Location((15.301734948, -13.370090036, 0), (0, 0, 270))):
            Circle(SKETCH10_R)
        with Locations(Location((13.370090036, 15.301734948, 0), (0, 0, 270))):
            Circle(SKETCH10_R)
        with Locations(Location((-15.301734948, 13.370090036, 0), (0, 0, 270))):
            Circle(SKETCH10_R)
        with Locations(Location((-13.370090036, -15.301734948, 0), (0, 0, 270))):
            Circle(SKETCH10_R)
    extrude(amount=-CUT_EXTRUDE4_DEPTH, mode=Mode.SUBTRACT)

    # Tap Drill for M5x0.8 Tap1 bore (on position points) → Tap Drill for M5x0.8 Tap1 (cut, up to next)
    with BuildSketch(Plane(origin=(15.301734948, 31.75, 13.370090036), x_dir=(0, 0, 1), z_dir=(0, 1, 0)), mode=Mode.PRIVATE) as tap_drill_for_m5x0_8_tap1_sk1:
        Circle(TAP_DRILL_FOR_M5X0_8_TAP1_BORE_R)
    tap_drill_for_m5x0_8_tap1_tool1 = extrude(tap_drill_for_m5x0_8_tap1_sk1.sketch, amount=-TAP_DRILL_FOR_M5X0_8_TAP1_REACH, mode=Mode.PRIVATE) & part.part
    # Tap Drill for M5x0.8 Tap1 bore (on position points) → Tap Drill for M5x0.8 Tap1 (cut, up to next)
    with BuildSketch(Plane(origin=(15.301734948, 31.75, 13.370090036), x_dir=(0, 0, 1), z_dir=(0, 1, 0)), mode=Mode.PRIVATE) as tap_drill_for_m5x0_8_tap1_sk2:
        with Locations((1.931644912, -28.671824984)):
            Circle(TAP_DRILL_FOR_M5X0_8_TAP1_BORE_R)
    tap_drill_for_m5x0_8_tap1_tool2 = extrude(tap_drill_for_m5x0_8_tap1_sk2.sketch, amount=-TAP_DRILL_FOR_M5X0_8_TAP1_REACH, mode=Mode.PRIVATE) & part.part
    # Tap Drill for M5x0.8 Tap1 bore (on position points) → Tap Drill for M5x0.8 Tap1 (cut, up to next)
    with BuildSketch(Plane(origin=(15.301734948, 31.75, 13.370090036), x_dir=(0, 0, 1), z_dir=(0, 1, 0)), mode=Mode.PRIVATE) as tap_drill_for_m5x0_8_tap1_sk3:
        with Locations((-26.740180072, -30.603469896)):
            Circle(TAP_DRILL_FOR_M5X0_8_TAP1_BORE_R)
    tap_drill_for_m5x0_8_tap1_tool3 = extrude(tap_drill_for_m5x0_8_tap1_sk3.sketch, amount=-TAP_DRILL_FOR_M5X0_8_TAP1_REACH, mode=Mode.PRIVATE) & part.part
    # Tap Drill for M5x0.8 Tap1 bore (on position points) → Tap Drill for M5x0.8 Tap1 (cut, up to next)
    with BuildSketch(Plane(origin=(15.301734948, 31.75, 13.370090036), x_dir=(0, 0, 1), z_dir=(0, 1, 0)), mode=Mode.PRIVATE) as tap_drill_for_m5x0_8_tap1_sk4:
        with Locations((-28.671824984, -1.931644912)):
            Circle(TAP_DRILL_FOR_M5X0_8_TAP1_BORE_R)
    tap_drill_for_m5x0_8_tap1_tool4 = extrude(tap_drill_for_m5x0_8_tap1_sk4.sketch, amount=-TAP_DRILL_FOR_M5X0_8_TAP1_REACH, mode=Mode.PRIVATE) & part.part
    add(tap_drill_for_m5x0_8_tap1_tool1.solids().sort_by_distance((15.301735, 31.75, 13.37009))[0], mode=Mode.SUBTRACT)
    add(tap_drill_for_m5x0_8_tap1_tool2.solids().sort_by_distance((-13.37009, 31.75, 15.301735))[0], mode=Mode.SUBTRACT)
    add(tap_drill_for_m5x0_8_tap1_tool3.solids().sort_by_distance((-15.301735, 31.75, -13.37009))[0], mode=Mode.SUBTRACT)
    add(tap_drill_for_m5x0_8_tap1_tool4.solids().sort_by_distance((13.37009, 31.75, -15.301735))[0], mode=Mode.SUBTRACT)


solid = part.part
